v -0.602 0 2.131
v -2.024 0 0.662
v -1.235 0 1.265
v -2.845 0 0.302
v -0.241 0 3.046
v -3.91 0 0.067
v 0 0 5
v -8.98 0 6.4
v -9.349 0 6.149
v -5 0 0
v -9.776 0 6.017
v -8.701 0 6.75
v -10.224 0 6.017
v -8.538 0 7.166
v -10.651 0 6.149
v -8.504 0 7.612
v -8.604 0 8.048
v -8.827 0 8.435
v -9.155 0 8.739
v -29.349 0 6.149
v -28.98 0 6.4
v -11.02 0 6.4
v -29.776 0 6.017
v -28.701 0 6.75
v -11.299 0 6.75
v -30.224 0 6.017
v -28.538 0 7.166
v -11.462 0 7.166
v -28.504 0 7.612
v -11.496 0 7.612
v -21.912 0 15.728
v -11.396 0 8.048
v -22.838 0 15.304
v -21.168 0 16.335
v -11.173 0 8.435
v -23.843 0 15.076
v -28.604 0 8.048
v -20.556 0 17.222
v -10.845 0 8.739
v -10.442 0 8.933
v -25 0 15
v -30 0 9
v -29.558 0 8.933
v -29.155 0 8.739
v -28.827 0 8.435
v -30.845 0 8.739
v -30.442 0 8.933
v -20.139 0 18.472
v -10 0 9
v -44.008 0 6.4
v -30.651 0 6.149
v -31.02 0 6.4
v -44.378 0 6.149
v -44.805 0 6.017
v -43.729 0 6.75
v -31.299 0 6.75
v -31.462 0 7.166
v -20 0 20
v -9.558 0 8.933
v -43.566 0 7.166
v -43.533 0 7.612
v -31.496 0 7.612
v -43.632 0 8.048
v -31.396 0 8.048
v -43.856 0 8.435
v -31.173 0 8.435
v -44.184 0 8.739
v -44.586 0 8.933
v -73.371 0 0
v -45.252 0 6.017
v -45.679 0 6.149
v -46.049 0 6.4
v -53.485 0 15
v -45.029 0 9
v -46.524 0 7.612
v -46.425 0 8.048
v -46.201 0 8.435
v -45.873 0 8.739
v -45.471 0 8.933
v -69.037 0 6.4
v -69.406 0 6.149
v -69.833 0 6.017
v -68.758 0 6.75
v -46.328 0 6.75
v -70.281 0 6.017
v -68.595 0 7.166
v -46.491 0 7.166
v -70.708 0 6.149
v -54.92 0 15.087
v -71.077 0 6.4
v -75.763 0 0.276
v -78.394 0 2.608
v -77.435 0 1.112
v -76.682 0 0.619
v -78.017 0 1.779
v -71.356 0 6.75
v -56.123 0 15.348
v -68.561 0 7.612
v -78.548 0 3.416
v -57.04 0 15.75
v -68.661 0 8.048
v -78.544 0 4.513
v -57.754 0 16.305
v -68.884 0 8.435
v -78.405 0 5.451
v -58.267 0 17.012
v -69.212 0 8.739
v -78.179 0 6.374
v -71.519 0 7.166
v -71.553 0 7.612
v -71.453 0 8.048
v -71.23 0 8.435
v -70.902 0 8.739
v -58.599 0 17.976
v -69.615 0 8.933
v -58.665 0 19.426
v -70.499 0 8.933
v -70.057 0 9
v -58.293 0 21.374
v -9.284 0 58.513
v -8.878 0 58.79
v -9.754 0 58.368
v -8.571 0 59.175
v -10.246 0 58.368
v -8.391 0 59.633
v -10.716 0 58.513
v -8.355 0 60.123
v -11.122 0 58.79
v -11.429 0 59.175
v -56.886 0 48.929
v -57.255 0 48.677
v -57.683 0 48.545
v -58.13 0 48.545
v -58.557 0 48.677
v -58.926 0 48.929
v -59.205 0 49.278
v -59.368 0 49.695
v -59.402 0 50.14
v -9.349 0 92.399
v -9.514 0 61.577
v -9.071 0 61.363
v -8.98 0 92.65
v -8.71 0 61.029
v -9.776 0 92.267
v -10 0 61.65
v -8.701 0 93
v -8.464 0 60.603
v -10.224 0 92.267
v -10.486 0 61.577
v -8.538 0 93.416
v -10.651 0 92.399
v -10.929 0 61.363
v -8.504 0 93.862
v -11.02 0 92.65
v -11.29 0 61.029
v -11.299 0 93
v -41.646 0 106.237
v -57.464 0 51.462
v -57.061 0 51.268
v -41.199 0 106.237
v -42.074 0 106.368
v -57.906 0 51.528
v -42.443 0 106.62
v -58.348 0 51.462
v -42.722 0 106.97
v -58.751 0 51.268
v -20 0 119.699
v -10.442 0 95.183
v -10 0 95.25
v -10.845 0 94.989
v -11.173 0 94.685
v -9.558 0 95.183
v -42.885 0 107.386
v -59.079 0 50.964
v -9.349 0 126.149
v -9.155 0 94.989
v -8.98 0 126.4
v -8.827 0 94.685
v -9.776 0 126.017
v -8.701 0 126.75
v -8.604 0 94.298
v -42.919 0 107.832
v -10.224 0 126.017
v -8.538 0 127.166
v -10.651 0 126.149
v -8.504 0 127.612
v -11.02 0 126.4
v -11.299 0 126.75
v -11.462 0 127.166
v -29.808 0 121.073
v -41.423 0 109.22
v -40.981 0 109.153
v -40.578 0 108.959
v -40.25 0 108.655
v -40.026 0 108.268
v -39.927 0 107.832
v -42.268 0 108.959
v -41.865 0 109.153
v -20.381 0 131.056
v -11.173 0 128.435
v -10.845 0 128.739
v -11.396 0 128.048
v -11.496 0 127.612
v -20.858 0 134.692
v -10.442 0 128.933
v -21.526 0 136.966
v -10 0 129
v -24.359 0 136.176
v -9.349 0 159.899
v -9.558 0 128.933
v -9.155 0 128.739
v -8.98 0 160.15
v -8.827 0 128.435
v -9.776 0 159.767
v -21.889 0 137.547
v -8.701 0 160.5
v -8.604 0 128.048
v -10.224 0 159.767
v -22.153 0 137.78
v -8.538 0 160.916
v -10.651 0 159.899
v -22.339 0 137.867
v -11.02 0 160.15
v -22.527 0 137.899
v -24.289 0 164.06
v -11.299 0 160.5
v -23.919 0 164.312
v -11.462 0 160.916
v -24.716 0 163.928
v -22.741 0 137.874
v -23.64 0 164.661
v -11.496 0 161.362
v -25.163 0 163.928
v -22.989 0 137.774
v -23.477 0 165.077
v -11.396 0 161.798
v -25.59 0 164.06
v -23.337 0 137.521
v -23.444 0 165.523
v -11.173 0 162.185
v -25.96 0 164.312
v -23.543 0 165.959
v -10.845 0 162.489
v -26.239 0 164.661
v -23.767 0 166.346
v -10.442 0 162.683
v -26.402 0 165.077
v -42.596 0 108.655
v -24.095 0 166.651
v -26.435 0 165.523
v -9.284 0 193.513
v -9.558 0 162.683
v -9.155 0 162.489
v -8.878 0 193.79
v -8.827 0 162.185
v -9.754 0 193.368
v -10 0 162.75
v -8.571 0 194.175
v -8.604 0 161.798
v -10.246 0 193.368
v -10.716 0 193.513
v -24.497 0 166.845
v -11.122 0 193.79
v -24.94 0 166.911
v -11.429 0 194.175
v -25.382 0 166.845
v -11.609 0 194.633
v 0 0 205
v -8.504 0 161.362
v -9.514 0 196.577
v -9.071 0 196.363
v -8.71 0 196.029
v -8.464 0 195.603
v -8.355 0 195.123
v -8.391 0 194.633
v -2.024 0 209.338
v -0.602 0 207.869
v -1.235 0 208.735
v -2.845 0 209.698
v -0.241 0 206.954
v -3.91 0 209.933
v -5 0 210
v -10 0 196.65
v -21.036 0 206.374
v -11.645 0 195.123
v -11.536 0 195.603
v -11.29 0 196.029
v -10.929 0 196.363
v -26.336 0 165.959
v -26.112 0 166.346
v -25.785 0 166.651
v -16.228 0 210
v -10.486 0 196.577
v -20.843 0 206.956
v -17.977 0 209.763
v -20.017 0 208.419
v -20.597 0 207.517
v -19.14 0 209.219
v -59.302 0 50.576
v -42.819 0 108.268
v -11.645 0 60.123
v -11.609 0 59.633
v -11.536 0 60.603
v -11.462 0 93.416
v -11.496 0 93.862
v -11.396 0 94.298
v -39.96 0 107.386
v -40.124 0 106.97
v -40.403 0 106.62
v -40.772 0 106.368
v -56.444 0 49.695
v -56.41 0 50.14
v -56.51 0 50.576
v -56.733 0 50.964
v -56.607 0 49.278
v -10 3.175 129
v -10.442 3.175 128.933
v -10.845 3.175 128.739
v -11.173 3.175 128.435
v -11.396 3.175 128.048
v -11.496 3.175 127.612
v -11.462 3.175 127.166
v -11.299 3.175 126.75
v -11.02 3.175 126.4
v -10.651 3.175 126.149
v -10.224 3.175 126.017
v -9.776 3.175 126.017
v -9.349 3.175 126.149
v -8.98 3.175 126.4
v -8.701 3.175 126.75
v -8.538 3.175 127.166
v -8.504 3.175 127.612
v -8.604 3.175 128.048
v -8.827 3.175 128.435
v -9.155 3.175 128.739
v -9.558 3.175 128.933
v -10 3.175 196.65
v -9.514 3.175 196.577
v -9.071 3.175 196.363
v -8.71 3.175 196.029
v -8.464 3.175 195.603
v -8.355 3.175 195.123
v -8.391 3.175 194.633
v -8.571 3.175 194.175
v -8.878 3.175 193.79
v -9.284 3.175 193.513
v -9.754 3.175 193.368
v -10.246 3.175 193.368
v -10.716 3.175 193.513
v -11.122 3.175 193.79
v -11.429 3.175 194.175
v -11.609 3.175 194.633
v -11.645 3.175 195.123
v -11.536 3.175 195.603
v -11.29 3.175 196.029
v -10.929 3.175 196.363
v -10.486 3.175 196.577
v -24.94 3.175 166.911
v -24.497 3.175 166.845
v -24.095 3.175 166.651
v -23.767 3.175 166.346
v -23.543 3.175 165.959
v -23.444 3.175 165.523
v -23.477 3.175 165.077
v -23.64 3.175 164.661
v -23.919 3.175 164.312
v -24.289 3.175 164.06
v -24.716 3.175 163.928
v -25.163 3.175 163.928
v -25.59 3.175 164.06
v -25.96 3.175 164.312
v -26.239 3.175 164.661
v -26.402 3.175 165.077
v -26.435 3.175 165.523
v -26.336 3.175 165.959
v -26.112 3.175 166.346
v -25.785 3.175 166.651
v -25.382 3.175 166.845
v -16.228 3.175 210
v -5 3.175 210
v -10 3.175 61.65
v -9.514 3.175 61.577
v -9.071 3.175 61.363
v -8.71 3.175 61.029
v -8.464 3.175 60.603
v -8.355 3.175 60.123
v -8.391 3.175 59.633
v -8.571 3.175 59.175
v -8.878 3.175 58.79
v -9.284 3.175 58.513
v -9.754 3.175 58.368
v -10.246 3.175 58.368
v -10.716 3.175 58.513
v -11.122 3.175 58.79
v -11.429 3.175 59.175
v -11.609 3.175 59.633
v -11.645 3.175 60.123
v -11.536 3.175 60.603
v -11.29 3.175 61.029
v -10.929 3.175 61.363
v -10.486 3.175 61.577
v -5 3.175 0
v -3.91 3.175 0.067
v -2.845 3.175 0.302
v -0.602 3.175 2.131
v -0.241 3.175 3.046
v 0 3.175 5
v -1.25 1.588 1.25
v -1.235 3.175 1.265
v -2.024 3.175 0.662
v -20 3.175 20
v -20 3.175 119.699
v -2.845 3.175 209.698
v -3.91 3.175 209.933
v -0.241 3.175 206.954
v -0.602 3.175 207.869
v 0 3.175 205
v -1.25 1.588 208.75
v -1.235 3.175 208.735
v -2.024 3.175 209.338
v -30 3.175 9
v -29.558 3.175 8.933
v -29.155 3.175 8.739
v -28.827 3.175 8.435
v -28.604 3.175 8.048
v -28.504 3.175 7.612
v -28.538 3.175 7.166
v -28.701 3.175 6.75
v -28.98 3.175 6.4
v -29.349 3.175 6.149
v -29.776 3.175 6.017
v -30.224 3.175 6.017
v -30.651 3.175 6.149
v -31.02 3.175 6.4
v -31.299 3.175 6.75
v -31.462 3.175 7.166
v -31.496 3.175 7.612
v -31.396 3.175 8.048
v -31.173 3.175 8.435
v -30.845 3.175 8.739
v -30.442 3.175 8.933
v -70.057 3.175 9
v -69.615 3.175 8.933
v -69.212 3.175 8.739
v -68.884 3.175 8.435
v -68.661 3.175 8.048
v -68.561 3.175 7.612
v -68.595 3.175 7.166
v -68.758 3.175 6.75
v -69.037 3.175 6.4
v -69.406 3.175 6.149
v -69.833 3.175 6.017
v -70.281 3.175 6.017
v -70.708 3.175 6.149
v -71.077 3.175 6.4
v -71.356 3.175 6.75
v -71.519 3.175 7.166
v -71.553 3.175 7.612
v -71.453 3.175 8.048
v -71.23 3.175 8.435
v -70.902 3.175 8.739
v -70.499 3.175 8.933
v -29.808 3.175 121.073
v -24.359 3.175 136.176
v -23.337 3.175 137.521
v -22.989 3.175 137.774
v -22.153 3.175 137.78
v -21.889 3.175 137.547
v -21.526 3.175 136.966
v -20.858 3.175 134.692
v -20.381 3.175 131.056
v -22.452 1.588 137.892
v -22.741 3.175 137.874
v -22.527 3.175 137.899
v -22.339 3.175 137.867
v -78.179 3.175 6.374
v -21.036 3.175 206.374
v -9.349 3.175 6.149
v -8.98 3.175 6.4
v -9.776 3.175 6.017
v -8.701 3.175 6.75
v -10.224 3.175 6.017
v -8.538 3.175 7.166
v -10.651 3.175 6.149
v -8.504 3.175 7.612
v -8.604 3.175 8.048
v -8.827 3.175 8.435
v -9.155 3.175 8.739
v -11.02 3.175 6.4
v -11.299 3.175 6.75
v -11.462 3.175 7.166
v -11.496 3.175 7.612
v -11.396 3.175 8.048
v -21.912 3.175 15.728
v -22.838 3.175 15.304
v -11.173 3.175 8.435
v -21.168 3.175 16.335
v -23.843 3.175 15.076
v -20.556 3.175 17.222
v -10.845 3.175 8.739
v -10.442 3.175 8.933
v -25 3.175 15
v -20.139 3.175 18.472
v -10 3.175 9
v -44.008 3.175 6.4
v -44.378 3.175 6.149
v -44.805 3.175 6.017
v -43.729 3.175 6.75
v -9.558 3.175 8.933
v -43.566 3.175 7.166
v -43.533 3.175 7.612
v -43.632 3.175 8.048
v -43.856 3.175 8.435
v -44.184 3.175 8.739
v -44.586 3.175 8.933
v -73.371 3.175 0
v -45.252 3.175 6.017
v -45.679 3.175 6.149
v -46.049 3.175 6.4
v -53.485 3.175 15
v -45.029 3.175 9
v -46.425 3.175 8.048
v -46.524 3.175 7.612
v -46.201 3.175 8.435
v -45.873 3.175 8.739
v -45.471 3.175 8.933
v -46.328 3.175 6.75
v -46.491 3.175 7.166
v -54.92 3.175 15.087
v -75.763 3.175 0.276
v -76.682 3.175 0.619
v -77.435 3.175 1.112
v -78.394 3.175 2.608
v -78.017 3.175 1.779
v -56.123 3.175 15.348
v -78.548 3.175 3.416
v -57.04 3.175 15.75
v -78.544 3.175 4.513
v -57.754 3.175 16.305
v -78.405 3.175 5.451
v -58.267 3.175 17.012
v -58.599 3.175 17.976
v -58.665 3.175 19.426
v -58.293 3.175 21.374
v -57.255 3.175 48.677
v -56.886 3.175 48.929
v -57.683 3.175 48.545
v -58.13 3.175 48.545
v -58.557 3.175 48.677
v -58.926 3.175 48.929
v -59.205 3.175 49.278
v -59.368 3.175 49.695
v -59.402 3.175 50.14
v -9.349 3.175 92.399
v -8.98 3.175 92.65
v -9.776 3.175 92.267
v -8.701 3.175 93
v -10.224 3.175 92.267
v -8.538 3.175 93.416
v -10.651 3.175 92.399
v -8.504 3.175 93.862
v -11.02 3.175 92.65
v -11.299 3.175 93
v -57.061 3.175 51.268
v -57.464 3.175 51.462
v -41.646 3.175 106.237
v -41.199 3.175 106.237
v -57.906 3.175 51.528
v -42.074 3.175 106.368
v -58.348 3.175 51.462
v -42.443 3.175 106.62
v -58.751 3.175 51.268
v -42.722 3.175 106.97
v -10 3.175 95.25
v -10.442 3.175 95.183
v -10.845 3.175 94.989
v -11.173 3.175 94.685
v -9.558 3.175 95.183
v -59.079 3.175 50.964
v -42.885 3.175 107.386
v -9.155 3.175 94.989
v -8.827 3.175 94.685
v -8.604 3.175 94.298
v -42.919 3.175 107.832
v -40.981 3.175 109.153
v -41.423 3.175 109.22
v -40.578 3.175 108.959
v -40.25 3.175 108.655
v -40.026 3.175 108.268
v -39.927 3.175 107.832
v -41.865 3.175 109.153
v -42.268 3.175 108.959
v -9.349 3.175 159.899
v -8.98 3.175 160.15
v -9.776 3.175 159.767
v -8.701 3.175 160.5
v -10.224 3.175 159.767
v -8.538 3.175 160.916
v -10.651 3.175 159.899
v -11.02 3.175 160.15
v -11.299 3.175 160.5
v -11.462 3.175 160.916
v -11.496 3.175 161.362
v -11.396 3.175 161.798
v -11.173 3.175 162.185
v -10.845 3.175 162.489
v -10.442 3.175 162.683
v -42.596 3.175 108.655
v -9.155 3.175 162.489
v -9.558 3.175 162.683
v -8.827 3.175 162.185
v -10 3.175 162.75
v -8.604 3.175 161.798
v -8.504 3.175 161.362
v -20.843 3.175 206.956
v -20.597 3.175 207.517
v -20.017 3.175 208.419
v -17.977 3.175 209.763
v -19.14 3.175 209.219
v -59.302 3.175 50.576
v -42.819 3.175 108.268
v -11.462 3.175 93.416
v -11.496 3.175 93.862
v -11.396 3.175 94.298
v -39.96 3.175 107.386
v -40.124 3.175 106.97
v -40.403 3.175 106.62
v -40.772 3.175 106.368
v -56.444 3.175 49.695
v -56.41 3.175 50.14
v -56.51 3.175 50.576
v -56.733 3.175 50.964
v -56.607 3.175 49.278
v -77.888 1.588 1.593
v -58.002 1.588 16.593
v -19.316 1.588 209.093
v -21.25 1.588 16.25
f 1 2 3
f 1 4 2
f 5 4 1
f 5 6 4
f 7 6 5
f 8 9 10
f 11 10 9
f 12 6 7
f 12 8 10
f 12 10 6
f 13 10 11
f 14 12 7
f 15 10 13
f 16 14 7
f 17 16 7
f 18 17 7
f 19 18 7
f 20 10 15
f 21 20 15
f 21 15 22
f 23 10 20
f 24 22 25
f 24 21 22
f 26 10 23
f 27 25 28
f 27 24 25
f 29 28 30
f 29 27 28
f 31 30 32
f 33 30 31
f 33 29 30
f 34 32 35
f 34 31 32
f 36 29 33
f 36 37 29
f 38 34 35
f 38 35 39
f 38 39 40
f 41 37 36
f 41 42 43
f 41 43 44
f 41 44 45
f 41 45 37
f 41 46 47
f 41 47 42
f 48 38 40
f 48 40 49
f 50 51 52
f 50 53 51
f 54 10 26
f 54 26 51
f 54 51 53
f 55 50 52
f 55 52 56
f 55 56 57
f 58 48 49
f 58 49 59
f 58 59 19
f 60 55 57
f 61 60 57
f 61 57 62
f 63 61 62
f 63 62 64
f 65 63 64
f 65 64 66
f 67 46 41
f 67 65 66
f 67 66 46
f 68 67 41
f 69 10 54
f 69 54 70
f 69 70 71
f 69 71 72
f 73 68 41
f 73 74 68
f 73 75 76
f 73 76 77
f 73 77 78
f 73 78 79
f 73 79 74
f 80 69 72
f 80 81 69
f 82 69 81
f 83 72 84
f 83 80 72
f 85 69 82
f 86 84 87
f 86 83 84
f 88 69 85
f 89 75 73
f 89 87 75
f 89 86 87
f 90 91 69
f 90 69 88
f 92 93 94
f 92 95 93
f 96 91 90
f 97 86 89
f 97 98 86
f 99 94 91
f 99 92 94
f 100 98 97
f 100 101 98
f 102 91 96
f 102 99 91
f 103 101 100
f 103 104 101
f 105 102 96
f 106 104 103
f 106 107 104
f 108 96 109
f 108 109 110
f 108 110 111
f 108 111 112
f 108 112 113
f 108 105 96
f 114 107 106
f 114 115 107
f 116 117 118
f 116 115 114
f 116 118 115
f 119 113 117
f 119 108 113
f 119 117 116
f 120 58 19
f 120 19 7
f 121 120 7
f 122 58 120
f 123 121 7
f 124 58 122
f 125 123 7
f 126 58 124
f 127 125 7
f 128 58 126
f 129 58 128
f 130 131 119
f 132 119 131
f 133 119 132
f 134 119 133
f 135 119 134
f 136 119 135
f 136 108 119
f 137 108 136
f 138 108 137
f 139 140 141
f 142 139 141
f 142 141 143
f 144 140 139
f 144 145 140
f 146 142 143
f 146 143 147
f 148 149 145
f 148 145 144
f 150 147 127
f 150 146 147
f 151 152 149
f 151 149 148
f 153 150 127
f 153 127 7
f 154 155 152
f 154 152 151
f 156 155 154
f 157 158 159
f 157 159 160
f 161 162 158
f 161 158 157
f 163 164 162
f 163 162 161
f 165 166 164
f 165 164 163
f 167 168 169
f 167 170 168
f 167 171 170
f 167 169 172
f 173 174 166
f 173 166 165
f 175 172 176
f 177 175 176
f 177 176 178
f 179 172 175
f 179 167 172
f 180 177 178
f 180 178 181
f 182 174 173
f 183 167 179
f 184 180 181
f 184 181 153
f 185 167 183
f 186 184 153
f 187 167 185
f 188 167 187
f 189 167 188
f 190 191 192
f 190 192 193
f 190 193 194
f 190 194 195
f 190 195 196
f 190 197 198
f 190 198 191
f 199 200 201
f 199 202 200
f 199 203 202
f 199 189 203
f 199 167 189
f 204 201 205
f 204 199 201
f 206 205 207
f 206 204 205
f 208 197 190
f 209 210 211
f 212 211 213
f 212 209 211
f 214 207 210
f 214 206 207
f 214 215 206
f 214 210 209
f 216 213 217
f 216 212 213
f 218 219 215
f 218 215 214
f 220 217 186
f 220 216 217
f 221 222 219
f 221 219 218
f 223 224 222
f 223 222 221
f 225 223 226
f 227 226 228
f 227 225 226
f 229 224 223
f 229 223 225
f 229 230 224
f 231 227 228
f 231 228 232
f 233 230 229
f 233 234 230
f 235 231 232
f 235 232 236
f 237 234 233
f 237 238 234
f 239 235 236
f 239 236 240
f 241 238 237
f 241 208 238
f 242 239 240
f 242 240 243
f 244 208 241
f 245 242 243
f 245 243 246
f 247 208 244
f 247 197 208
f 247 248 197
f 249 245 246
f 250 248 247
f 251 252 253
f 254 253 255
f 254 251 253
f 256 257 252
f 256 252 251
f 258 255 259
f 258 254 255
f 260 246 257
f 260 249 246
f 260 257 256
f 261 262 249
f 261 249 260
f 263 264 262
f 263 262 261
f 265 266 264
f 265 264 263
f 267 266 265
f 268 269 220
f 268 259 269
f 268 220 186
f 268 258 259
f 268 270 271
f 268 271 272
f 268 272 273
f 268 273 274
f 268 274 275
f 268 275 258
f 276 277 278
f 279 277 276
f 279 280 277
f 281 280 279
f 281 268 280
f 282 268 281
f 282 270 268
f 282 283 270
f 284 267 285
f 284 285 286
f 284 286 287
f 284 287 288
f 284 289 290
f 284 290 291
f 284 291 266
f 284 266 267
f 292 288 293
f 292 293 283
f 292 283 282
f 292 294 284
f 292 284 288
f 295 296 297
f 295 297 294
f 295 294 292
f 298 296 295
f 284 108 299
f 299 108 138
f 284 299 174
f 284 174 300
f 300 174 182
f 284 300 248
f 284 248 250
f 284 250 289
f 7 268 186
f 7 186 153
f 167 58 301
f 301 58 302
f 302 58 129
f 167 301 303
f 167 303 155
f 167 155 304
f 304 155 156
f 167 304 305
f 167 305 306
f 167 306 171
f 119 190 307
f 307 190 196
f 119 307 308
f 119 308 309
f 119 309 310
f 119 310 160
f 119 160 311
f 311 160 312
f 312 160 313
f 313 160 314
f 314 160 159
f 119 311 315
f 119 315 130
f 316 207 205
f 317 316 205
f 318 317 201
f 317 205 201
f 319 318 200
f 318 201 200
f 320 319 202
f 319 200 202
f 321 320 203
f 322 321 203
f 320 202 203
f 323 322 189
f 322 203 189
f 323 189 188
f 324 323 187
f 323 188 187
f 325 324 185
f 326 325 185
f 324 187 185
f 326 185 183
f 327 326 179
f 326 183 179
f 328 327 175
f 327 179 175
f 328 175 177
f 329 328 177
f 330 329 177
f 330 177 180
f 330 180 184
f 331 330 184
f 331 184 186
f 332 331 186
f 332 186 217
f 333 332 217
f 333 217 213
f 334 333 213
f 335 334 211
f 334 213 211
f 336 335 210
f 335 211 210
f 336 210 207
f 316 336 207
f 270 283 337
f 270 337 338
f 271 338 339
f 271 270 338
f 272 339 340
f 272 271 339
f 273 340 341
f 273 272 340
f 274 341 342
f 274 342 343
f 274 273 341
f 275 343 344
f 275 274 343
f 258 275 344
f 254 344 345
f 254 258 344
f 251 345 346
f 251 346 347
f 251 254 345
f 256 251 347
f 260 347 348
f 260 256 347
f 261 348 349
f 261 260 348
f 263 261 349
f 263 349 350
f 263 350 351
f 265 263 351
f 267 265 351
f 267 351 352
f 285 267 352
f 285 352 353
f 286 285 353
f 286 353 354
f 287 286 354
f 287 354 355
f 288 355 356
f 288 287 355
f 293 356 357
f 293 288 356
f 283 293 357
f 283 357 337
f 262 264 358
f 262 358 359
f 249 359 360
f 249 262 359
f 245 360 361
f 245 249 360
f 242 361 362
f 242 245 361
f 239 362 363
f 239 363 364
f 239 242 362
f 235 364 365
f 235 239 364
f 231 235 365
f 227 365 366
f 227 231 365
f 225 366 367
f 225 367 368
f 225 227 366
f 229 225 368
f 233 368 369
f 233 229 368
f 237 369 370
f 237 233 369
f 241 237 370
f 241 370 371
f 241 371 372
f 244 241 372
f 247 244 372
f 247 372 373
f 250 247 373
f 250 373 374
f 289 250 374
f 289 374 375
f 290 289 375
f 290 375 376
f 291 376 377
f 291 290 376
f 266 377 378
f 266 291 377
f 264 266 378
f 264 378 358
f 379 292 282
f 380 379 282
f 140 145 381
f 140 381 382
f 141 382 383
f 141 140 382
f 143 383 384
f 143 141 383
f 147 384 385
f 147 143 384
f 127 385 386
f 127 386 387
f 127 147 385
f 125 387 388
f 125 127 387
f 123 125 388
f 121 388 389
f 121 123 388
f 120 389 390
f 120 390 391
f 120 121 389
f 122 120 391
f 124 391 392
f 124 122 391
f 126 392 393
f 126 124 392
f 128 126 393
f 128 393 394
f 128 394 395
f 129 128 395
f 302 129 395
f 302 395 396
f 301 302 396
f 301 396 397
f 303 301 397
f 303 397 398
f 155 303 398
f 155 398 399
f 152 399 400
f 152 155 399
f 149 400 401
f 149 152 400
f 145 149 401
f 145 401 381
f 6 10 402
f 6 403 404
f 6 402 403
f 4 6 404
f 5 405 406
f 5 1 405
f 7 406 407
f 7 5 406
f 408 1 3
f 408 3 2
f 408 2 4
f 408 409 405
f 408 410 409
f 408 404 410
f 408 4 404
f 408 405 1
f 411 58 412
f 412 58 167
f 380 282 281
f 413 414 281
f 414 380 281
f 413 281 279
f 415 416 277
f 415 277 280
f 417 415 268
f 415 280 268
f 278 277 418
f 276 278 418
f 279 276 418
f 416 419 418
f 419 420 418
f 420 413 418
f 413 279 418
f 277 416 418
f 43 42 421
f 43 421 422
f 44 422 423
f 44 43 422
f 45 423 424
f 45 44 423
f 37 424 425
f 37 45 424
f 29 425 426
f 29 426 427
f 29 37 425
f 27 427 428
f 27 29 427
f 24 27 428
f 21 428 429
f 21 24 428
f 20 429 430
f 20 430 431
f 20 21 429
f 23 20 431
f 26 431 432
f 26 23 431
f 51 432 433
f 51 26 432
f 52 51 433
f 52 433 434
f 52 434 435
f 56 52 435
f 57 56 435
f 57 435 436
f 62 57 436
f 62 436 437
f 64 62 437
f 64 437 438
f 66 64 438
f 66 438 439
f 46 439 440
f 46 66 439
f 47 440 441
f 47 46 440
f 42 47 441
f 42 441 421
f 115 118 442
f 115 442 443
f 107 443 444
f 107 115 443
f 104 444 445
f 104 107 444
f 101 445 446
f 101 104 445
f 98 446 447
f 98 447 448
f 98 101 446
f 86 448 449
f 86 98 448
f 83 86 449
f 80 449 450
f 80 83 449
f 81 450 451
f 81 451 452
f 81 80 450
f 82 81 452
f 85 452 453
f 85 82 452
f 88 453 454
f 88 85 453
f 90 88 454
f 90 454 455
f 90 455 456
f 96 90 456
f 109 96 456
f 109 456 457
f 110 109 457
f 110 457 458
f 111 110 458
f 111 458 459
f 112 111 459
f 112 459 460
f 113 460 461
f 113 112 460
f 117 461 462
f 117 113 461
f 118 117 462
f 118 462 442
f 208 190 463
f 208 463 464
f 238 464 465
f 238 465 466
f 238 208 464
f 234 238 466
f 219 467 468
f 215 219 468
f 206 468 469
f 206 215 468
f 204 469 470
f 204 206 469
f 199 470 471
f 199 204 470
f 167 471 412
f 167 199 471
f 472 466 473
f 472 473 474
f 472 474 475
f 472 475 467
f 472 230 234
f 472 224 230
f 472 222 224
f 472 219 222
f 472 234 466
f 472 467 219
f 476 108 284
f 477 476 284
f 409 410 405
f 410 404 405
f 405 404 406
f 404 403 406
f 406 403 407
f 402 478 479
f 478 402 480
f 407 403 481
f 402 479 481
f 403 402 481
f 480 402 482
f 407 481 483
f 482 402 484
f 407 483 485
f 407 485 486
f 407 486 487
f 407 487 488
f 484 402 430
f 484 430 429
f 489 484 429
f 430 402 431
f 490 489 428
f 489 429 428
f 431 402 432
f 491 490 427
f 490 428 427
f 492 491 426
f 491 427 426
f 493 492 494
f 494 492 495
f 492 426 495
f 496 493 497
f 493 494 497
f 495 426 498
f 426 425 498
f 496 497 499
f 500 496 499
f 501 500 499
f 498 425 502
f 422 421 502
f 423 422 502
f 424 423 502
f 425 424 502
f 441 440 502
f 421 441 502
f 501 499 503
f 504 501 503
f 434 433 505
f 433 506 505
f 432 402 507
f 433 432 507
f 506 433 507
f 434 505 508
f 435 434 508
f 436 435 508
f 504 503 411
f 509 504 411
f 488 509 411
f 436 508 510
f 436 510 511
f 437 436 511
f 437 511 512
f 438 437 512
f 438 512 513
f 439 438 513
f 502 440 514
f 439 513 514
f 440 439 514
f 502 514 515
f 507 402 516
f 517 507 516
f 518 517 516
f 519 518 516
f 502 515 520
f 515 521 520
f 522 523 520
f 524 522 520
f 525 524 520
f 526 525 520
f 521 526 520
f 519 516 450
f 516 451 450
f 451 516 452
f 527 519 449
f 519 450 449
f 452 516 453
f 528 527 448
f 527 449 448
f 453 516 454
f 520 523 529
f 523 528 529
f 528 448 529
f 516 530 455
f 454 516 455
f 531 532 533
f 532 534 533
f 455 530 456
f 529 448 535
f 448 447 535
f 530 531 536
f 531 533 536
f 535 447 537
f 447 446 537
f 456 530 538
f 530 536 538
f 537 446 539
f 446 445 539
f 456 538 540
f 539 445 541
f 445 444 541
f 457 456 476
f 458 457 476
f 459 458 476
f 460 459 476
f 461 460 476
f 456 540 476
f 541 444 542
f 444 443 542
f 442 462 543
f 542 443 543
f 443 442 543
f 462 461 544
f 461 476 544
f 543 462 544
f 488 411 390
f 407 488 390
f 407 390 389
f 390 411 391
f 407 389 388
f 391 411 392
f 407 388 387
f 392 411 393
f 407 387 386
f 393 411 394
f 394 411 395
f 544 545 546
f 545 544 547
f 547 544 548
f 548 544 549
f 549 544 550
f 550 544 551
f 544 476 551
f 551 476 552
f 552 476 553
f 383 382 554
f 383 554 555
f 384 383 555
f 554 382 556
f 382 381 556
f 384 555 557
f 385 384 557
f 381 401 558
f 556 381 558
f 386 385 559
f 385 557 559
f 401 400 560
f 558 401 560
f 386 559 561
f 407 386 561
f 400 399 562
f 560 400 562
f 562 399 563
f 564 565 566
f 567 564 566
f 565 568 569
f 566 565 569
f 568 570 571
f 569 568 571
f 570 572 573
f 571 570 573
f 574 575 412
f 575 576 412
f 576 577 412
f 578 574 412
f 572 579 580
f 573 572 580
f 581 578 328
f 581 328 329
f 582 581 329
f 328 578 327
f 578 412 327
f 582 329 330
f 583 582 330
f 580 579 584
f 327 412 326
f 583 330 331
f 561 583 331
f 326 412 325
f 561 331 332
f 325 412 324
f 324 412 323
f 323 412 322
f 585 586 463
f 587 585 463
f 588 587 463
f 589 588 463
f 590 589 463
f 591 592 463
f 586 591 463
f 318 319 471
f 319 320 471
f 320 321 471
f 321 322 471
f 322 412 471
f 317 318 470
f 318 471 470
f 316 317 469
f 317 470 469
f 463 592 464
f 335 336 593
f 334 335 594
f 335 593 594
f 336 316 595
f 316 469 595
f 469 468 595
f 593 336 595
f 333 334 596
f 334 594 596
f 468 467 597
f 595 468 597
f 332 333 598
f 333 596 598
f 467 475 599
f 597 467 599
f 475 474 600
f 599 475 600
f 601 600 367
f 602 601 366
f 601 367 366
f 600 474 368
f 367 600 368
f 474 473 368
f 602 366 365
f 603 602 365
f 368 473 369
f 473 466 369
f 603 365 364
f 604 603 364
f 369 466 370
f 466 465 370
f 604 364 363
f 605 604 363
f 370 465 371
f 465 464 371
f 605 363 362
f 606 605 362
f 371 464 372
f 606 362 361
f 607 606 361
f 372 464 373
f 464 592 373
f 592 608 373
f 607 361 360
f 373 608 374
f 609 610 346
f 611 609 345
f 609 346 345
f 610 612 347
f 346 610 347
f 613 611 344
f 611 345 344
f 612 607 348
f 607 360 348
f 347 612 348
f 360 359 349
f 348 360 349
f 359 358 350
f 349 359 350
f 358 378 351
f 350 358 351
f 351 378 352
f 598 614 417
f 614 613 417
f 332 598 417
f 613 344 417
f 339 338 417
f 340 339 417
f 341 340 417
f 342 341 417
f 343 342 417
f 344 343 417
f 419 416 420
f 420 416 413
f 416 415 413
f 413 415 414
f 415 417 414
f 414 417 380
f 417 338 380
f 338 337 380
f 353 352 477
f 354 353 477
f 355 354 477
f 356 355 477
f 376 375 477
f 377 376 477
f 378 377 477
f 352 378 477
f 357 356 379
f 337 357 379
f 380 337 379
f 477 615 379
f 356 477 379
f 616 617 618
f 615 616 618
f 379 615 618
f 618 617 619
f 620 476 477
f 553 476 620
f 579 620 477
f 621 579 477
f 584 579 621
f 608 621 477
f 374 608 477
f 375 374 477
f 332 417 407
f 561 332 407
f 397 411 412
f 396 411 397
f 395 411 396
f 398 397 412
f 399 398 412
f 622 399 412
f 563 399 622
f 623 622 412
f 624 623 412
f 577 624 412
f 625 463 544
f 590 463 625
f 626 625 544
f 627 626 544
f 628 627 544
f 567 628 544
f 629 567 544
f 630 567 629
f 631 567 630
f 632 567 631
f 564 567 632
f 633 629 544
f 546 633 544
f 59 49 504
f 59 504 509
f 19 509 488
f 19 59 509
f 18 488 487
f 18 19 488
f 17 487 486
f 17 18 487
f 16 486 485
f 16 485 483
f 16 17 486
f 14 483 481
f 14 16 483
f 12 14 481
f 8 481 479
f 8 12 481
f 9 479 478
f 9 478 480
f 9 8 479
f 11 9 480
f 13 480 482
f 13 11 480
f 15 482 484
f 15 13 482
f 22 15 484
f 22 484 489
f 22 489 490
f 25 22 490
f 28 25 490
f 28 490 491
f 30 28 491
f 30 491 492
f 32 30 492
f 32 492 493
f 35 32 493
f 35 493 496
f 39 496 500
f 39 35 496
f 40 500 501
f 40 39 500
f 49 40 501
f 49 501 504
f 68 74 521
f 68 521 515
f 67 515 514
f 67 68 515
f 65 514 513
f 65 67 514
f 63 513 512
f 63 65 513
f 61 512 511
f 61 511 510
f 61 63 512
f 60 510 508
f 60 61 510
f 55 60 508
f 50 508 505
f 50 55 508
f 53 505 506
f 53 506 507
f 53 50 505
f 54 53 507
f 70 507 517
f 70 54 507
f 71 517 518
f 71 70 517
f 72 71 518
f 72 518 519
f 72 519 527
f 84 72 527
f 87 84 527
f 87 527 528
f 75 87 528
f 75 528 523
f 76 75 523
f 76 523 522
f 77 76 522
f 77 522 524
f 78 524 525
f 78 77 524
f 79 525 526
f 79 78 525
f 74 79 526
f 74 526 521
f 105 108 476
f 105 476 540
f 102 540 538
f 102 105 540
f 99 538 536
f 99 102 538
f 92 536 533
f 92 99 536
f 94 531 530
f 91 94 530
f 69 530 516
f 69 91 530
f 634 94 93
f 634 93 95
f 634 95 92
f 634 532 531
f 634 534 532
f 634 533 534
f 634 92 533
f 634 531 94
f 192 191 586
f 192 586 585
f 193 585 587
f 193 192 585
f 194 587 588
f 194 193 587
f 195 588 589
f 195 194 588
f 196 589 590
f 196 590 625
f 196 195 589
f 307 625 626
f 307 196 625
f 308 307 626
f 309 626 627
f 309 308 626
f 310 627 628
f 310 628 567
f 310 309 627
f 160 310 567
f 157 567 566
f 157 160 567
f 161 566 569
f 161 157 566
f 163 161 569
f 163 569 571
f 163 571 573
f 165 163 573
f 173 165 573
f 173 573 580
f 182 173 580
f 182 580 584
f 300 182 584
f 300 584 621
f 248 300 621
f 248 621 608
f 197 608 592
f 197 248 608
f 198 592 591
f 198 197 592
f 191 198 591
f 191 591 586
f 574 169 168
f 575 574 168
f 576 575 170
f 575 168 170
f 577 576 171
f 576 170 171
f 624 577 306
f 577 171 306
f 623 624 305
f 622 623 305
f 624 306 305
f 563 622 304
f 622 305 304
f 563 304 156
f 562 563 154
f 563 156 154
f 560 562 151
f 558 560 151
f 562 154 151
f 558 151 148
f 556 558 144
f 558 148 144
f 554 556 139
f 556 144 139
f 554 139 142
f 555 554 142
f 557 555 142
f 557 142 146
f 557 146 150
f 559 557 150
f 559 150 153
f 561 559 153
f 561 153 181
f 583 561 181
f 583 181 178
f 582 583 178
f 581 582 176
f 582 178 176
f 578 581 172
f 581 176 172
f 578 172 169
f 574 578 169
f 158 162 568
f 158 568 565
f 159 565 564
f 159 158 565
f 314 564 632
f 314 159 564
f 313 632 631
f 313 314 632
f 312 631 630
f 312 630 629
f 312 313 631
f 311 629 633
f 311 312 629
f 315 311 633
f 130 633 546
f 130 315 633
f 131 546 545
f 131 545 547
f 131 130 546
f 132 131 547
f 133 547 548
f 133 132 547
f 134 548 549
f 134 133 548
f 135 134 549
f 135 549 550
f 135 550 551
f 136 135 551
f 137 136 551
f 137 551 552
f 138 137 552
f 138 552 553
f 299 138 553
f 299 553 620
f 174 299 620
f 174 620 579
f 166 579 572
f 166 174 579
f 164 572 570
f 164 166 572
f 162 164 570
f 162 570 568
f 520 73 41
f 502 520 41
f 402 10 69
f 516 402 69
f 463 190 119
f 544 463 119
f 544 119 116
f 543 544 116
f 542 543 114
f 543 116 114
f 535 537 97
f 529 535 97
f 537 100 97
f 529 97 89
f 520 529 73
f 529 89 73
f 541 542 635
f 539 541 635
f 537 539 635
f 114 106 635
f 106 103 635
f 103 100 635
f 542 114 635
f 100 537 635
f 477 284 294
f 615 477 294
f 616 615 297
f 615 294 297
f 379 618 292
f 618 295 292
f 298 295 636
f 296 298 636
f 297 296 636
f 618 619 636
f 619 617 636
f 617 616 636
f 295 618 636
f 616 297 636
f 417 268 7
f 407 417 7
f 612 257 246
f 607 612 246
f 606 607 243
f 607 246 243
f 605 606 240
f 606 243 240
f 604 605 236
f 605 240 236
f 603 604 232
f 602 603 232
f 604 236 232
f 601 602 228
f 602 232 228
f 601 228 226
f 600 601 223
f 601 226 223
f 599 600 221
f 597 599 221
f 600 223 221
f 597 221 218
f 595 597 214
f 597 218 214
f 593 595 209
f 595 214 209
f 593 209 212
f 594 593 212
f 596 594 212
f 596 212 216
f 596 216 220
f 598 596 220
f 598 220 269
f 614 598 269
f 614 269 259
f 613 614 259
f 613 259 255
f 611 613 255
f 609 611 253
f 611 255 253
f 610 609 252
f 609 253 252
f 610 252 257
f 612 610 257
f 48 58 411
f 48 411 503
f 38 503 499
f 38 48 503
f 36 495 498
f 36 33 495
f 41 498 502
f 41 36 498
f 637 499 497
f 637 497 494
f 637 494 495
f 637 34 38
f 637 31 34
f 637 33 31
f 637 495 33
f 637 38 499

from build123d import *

# Parameters (mm, degrees)
SKETCH1_R           = 1.5
SKETCH1_R_2         = 1.65
BOSS_EXTRUDE1_DEPTH = 3.175
FILLET1_SIZE        = 5


with BuildPart() as part:
    # Sketch1 → Boss-Extrude1 (new body)
    with BuildSketch(Plane(origin=(0, 0, 0), x_dir=(1, 0, 0), z_dir=(0, 1, 0))):
        Polygon((-20, -210), (0, -210), (0, 0), (-80, 0), align=None)
        with Locations(Location((-41.422797756, -107.71979577, 0), (0, 0, 270))):
            Circle(SKETCH1_R, mode=Mode.SUBTRACT)
        with Locations(Location((-24.939530082, -165.411232629, 0), (0, 0, 270))):
            Circle(SKETCH1_R, mode=Mode.SUBTRACT)
        with Locations(Location((-10, -195, 0), (0, 0, 270))):
            Circle(SKETCH1_R_2, mode=Mode.SUBTRACT)
        with BuildLine():
            ThreePointArc((-10, -159.75), (-8.5, -161.25), (-10, -162.75))
            ThreePointArc((-10, -162.75), (-11.5, -161.25), (-10, -159.75))
        make_face(mode=Mode.SUBTRACT)
        with BuildLine():
            ThreePointArc((-10, -126), (-8.5, -127.5), (-10, -129))
            ThreePointArc((-10, -129), (-11.5, -127.5), (-10, -126))
        make_face(mode=Mode.SUBTRACT)
        Polygon((-20, -15), (-20, -155.39917583), (-60.114050237, -15), align=None, mode=Mode.SUBTRACT)
        with Locations(Location((-57.90606543, -50.028358912, 0), (0, 0, 270))):
            Circle(SKETCH1_R, mode=Mode.SUBTRACT)
        with Locations(Location((-70.057025119, -7.5, 0), (0, 0, 270))):
            Circle(SKETCH1_R, mode=Mode.SUBTRACT)
        with Locations(Location((-45.028512559, -7.5, 0), (0, 0, 270))):
            Circle(SKETCH1_R, mode=Mode.SUBTRACT)
        with BuildLine():
            ThreePointArc((-10, -92.25), (-8.5, -93.75), (-10, -95.25))
            ThreePointArc((-10, -95.25), (-11.5, -93.75), (-10, -92.25))
        make_face(mode=Mode.SUBTRACT)
        with Locations(Location((-10, -60, 0), (0, 0, 270))):
            Circle(SKETCH1_R_2, mode=Mode.SUBTRACT)
        with Locations(Location((-30, -7.5, 0), (0, 0, 270))):
            Circle(SKETCH1_R, mode=Mode.SUBTRACT)
        with Locations(Location((-10, -7.5, 0), (0, 0, 270))):
            Circle(SKETCH1_R, mode=Mode.SUBTRACT)
    extrude(amount=BOSS_EXTRUDE1_DEPTH)

    # Fillet1
    # a fillet whose section is not a circle: 5 mm, written as the material it adds along each edge
    with BuildSketch(Plane(origin=(-20, 0, 15), x_dir=(0, 0, 1), z_dir=(0, 1, 0))) as fillet1_piece_1:
        with BuildLine():
            Bezier((FILLET1_SIZE, 0), (0, 0), (0, -FILLET1_SIZE), weights=[1, 1, 1])
            Line((0, -FILLET1_SIZE), (0, 0))
            Line((0, 0), (FILLET1_SIZE, 0))
        make_face()
    extrude(amount=3.175)
    with BuildSketch(Plane(origin=(-60.114050237, 0, 15), x_dir=(0.2747211278973786, 0, 0.9615239476408229), z_dir=(0, 1, 0))) as fillet1_piece_2:
        with BuildLine():
            Bezier((6.628649921, 0), (0, 0), (1.821030183, 6.373605639), weights=[1, 1, 1])
            Line((1.821030183, 6.373605639), (0, 0))
            Line((0, 0), (6.628649921, 0))
        make_face()
    extrude(amount=3.175)
    with BuildSketch(Plane(origin=(-20, 0, 155.39917583), x_dir=(-0.274721127897378, 0, -0.961523947640823), z_dir=(0, 1, 0))) as fillet1_piece_3:
        with BuildLine():
            Bezier((35.700274723, 0), (0, 0), (34.326669084, -9.807619738), weights=[1, 1, 1])
            Line((34.326669084, -9.807619738), (0, 0))
            Line((0, 0), (35.700274723, 0))
        make_face()
    extrude(amount=3.175)
    # a fillet whose section is not a circle: 5 mm, written as the material it takes off along each edge
    with BuildSketch(Plane(origin=(-80, -16.571624802, 0), x_dir=(0.2747211278973785, 0, 0.9615239476408229), z_dir=(0, 1, 0))) as fillet1_2_piece_1:
        with BuildLine():
            Bezier((6.628649921, 0), (0, 0), (1.821030183, 6.373605639), weights=[1, 1, 1])
            Line((1.821030183, 6.373605639), (0, 0))
            Line((0, 0), (6.628649921, 0))
        make_face()
    extrude(amount=36.318249605, mode=Mode.SUBTRACT)
    with BuildSketch(Plane(origin=(0, -12.5, 0), x_dir=(-1, 0, 0), z_dir=(0, 1, 0))) as fillet1_2_piece_2:
        with BuildLine():
            Bezier((FILLET1_SIZE, 0), (0, 0), (0, FILLET1_SIZE), weights=[1, 1, 1])
            Line((0, FILLET1_SIZE), (0, 0))
            Line((0, 0), (FILLET1_SIZE, 0))
        make_face()
    extrude(amount=28.175, mode=Mode.SUBTRACT)
    with BuildSketch(Plane(origin=(0, -12.5, 210), x_dir=(-1, 0, 0), z_dir=(0, 1, 0))) as fillet1_2_piece_3:
        with BuildLine():
            Bezier((FILLET1_SIZE, 0), (0, 0), (0, -FILLET1_SIZE), weights=[1, 1, 1])
            Line((0, -FILLET1_SIZE), (0, 0))
            Line((0, 0), (FILLET1_SIZE, 0))
        make_face()
    extrude(amount=28.175, mode=Mode.SUBTRACT)
    with BuildSketch(Plane(origin=(-20, -9.428767659, 210), x_dir=(-0.2747211278973768, 0, -0.9615239476408235), z_dir=(0, 1, 0))) as fillet1_2_piece_4:
        with BuildLine():
            Bezier((3.771507064, 0), (0, 0), (-1.036112674, -3.626394361), weights=[1, 1, 1])
            Line((-1.036112674, -3.626394361), (0, 0))
            Line((0, 0), (3.771507064, 0))
        make_face()
    extrude(amount=22.032535319, mode=Mode.SUBTRACT)


solid = part.part
